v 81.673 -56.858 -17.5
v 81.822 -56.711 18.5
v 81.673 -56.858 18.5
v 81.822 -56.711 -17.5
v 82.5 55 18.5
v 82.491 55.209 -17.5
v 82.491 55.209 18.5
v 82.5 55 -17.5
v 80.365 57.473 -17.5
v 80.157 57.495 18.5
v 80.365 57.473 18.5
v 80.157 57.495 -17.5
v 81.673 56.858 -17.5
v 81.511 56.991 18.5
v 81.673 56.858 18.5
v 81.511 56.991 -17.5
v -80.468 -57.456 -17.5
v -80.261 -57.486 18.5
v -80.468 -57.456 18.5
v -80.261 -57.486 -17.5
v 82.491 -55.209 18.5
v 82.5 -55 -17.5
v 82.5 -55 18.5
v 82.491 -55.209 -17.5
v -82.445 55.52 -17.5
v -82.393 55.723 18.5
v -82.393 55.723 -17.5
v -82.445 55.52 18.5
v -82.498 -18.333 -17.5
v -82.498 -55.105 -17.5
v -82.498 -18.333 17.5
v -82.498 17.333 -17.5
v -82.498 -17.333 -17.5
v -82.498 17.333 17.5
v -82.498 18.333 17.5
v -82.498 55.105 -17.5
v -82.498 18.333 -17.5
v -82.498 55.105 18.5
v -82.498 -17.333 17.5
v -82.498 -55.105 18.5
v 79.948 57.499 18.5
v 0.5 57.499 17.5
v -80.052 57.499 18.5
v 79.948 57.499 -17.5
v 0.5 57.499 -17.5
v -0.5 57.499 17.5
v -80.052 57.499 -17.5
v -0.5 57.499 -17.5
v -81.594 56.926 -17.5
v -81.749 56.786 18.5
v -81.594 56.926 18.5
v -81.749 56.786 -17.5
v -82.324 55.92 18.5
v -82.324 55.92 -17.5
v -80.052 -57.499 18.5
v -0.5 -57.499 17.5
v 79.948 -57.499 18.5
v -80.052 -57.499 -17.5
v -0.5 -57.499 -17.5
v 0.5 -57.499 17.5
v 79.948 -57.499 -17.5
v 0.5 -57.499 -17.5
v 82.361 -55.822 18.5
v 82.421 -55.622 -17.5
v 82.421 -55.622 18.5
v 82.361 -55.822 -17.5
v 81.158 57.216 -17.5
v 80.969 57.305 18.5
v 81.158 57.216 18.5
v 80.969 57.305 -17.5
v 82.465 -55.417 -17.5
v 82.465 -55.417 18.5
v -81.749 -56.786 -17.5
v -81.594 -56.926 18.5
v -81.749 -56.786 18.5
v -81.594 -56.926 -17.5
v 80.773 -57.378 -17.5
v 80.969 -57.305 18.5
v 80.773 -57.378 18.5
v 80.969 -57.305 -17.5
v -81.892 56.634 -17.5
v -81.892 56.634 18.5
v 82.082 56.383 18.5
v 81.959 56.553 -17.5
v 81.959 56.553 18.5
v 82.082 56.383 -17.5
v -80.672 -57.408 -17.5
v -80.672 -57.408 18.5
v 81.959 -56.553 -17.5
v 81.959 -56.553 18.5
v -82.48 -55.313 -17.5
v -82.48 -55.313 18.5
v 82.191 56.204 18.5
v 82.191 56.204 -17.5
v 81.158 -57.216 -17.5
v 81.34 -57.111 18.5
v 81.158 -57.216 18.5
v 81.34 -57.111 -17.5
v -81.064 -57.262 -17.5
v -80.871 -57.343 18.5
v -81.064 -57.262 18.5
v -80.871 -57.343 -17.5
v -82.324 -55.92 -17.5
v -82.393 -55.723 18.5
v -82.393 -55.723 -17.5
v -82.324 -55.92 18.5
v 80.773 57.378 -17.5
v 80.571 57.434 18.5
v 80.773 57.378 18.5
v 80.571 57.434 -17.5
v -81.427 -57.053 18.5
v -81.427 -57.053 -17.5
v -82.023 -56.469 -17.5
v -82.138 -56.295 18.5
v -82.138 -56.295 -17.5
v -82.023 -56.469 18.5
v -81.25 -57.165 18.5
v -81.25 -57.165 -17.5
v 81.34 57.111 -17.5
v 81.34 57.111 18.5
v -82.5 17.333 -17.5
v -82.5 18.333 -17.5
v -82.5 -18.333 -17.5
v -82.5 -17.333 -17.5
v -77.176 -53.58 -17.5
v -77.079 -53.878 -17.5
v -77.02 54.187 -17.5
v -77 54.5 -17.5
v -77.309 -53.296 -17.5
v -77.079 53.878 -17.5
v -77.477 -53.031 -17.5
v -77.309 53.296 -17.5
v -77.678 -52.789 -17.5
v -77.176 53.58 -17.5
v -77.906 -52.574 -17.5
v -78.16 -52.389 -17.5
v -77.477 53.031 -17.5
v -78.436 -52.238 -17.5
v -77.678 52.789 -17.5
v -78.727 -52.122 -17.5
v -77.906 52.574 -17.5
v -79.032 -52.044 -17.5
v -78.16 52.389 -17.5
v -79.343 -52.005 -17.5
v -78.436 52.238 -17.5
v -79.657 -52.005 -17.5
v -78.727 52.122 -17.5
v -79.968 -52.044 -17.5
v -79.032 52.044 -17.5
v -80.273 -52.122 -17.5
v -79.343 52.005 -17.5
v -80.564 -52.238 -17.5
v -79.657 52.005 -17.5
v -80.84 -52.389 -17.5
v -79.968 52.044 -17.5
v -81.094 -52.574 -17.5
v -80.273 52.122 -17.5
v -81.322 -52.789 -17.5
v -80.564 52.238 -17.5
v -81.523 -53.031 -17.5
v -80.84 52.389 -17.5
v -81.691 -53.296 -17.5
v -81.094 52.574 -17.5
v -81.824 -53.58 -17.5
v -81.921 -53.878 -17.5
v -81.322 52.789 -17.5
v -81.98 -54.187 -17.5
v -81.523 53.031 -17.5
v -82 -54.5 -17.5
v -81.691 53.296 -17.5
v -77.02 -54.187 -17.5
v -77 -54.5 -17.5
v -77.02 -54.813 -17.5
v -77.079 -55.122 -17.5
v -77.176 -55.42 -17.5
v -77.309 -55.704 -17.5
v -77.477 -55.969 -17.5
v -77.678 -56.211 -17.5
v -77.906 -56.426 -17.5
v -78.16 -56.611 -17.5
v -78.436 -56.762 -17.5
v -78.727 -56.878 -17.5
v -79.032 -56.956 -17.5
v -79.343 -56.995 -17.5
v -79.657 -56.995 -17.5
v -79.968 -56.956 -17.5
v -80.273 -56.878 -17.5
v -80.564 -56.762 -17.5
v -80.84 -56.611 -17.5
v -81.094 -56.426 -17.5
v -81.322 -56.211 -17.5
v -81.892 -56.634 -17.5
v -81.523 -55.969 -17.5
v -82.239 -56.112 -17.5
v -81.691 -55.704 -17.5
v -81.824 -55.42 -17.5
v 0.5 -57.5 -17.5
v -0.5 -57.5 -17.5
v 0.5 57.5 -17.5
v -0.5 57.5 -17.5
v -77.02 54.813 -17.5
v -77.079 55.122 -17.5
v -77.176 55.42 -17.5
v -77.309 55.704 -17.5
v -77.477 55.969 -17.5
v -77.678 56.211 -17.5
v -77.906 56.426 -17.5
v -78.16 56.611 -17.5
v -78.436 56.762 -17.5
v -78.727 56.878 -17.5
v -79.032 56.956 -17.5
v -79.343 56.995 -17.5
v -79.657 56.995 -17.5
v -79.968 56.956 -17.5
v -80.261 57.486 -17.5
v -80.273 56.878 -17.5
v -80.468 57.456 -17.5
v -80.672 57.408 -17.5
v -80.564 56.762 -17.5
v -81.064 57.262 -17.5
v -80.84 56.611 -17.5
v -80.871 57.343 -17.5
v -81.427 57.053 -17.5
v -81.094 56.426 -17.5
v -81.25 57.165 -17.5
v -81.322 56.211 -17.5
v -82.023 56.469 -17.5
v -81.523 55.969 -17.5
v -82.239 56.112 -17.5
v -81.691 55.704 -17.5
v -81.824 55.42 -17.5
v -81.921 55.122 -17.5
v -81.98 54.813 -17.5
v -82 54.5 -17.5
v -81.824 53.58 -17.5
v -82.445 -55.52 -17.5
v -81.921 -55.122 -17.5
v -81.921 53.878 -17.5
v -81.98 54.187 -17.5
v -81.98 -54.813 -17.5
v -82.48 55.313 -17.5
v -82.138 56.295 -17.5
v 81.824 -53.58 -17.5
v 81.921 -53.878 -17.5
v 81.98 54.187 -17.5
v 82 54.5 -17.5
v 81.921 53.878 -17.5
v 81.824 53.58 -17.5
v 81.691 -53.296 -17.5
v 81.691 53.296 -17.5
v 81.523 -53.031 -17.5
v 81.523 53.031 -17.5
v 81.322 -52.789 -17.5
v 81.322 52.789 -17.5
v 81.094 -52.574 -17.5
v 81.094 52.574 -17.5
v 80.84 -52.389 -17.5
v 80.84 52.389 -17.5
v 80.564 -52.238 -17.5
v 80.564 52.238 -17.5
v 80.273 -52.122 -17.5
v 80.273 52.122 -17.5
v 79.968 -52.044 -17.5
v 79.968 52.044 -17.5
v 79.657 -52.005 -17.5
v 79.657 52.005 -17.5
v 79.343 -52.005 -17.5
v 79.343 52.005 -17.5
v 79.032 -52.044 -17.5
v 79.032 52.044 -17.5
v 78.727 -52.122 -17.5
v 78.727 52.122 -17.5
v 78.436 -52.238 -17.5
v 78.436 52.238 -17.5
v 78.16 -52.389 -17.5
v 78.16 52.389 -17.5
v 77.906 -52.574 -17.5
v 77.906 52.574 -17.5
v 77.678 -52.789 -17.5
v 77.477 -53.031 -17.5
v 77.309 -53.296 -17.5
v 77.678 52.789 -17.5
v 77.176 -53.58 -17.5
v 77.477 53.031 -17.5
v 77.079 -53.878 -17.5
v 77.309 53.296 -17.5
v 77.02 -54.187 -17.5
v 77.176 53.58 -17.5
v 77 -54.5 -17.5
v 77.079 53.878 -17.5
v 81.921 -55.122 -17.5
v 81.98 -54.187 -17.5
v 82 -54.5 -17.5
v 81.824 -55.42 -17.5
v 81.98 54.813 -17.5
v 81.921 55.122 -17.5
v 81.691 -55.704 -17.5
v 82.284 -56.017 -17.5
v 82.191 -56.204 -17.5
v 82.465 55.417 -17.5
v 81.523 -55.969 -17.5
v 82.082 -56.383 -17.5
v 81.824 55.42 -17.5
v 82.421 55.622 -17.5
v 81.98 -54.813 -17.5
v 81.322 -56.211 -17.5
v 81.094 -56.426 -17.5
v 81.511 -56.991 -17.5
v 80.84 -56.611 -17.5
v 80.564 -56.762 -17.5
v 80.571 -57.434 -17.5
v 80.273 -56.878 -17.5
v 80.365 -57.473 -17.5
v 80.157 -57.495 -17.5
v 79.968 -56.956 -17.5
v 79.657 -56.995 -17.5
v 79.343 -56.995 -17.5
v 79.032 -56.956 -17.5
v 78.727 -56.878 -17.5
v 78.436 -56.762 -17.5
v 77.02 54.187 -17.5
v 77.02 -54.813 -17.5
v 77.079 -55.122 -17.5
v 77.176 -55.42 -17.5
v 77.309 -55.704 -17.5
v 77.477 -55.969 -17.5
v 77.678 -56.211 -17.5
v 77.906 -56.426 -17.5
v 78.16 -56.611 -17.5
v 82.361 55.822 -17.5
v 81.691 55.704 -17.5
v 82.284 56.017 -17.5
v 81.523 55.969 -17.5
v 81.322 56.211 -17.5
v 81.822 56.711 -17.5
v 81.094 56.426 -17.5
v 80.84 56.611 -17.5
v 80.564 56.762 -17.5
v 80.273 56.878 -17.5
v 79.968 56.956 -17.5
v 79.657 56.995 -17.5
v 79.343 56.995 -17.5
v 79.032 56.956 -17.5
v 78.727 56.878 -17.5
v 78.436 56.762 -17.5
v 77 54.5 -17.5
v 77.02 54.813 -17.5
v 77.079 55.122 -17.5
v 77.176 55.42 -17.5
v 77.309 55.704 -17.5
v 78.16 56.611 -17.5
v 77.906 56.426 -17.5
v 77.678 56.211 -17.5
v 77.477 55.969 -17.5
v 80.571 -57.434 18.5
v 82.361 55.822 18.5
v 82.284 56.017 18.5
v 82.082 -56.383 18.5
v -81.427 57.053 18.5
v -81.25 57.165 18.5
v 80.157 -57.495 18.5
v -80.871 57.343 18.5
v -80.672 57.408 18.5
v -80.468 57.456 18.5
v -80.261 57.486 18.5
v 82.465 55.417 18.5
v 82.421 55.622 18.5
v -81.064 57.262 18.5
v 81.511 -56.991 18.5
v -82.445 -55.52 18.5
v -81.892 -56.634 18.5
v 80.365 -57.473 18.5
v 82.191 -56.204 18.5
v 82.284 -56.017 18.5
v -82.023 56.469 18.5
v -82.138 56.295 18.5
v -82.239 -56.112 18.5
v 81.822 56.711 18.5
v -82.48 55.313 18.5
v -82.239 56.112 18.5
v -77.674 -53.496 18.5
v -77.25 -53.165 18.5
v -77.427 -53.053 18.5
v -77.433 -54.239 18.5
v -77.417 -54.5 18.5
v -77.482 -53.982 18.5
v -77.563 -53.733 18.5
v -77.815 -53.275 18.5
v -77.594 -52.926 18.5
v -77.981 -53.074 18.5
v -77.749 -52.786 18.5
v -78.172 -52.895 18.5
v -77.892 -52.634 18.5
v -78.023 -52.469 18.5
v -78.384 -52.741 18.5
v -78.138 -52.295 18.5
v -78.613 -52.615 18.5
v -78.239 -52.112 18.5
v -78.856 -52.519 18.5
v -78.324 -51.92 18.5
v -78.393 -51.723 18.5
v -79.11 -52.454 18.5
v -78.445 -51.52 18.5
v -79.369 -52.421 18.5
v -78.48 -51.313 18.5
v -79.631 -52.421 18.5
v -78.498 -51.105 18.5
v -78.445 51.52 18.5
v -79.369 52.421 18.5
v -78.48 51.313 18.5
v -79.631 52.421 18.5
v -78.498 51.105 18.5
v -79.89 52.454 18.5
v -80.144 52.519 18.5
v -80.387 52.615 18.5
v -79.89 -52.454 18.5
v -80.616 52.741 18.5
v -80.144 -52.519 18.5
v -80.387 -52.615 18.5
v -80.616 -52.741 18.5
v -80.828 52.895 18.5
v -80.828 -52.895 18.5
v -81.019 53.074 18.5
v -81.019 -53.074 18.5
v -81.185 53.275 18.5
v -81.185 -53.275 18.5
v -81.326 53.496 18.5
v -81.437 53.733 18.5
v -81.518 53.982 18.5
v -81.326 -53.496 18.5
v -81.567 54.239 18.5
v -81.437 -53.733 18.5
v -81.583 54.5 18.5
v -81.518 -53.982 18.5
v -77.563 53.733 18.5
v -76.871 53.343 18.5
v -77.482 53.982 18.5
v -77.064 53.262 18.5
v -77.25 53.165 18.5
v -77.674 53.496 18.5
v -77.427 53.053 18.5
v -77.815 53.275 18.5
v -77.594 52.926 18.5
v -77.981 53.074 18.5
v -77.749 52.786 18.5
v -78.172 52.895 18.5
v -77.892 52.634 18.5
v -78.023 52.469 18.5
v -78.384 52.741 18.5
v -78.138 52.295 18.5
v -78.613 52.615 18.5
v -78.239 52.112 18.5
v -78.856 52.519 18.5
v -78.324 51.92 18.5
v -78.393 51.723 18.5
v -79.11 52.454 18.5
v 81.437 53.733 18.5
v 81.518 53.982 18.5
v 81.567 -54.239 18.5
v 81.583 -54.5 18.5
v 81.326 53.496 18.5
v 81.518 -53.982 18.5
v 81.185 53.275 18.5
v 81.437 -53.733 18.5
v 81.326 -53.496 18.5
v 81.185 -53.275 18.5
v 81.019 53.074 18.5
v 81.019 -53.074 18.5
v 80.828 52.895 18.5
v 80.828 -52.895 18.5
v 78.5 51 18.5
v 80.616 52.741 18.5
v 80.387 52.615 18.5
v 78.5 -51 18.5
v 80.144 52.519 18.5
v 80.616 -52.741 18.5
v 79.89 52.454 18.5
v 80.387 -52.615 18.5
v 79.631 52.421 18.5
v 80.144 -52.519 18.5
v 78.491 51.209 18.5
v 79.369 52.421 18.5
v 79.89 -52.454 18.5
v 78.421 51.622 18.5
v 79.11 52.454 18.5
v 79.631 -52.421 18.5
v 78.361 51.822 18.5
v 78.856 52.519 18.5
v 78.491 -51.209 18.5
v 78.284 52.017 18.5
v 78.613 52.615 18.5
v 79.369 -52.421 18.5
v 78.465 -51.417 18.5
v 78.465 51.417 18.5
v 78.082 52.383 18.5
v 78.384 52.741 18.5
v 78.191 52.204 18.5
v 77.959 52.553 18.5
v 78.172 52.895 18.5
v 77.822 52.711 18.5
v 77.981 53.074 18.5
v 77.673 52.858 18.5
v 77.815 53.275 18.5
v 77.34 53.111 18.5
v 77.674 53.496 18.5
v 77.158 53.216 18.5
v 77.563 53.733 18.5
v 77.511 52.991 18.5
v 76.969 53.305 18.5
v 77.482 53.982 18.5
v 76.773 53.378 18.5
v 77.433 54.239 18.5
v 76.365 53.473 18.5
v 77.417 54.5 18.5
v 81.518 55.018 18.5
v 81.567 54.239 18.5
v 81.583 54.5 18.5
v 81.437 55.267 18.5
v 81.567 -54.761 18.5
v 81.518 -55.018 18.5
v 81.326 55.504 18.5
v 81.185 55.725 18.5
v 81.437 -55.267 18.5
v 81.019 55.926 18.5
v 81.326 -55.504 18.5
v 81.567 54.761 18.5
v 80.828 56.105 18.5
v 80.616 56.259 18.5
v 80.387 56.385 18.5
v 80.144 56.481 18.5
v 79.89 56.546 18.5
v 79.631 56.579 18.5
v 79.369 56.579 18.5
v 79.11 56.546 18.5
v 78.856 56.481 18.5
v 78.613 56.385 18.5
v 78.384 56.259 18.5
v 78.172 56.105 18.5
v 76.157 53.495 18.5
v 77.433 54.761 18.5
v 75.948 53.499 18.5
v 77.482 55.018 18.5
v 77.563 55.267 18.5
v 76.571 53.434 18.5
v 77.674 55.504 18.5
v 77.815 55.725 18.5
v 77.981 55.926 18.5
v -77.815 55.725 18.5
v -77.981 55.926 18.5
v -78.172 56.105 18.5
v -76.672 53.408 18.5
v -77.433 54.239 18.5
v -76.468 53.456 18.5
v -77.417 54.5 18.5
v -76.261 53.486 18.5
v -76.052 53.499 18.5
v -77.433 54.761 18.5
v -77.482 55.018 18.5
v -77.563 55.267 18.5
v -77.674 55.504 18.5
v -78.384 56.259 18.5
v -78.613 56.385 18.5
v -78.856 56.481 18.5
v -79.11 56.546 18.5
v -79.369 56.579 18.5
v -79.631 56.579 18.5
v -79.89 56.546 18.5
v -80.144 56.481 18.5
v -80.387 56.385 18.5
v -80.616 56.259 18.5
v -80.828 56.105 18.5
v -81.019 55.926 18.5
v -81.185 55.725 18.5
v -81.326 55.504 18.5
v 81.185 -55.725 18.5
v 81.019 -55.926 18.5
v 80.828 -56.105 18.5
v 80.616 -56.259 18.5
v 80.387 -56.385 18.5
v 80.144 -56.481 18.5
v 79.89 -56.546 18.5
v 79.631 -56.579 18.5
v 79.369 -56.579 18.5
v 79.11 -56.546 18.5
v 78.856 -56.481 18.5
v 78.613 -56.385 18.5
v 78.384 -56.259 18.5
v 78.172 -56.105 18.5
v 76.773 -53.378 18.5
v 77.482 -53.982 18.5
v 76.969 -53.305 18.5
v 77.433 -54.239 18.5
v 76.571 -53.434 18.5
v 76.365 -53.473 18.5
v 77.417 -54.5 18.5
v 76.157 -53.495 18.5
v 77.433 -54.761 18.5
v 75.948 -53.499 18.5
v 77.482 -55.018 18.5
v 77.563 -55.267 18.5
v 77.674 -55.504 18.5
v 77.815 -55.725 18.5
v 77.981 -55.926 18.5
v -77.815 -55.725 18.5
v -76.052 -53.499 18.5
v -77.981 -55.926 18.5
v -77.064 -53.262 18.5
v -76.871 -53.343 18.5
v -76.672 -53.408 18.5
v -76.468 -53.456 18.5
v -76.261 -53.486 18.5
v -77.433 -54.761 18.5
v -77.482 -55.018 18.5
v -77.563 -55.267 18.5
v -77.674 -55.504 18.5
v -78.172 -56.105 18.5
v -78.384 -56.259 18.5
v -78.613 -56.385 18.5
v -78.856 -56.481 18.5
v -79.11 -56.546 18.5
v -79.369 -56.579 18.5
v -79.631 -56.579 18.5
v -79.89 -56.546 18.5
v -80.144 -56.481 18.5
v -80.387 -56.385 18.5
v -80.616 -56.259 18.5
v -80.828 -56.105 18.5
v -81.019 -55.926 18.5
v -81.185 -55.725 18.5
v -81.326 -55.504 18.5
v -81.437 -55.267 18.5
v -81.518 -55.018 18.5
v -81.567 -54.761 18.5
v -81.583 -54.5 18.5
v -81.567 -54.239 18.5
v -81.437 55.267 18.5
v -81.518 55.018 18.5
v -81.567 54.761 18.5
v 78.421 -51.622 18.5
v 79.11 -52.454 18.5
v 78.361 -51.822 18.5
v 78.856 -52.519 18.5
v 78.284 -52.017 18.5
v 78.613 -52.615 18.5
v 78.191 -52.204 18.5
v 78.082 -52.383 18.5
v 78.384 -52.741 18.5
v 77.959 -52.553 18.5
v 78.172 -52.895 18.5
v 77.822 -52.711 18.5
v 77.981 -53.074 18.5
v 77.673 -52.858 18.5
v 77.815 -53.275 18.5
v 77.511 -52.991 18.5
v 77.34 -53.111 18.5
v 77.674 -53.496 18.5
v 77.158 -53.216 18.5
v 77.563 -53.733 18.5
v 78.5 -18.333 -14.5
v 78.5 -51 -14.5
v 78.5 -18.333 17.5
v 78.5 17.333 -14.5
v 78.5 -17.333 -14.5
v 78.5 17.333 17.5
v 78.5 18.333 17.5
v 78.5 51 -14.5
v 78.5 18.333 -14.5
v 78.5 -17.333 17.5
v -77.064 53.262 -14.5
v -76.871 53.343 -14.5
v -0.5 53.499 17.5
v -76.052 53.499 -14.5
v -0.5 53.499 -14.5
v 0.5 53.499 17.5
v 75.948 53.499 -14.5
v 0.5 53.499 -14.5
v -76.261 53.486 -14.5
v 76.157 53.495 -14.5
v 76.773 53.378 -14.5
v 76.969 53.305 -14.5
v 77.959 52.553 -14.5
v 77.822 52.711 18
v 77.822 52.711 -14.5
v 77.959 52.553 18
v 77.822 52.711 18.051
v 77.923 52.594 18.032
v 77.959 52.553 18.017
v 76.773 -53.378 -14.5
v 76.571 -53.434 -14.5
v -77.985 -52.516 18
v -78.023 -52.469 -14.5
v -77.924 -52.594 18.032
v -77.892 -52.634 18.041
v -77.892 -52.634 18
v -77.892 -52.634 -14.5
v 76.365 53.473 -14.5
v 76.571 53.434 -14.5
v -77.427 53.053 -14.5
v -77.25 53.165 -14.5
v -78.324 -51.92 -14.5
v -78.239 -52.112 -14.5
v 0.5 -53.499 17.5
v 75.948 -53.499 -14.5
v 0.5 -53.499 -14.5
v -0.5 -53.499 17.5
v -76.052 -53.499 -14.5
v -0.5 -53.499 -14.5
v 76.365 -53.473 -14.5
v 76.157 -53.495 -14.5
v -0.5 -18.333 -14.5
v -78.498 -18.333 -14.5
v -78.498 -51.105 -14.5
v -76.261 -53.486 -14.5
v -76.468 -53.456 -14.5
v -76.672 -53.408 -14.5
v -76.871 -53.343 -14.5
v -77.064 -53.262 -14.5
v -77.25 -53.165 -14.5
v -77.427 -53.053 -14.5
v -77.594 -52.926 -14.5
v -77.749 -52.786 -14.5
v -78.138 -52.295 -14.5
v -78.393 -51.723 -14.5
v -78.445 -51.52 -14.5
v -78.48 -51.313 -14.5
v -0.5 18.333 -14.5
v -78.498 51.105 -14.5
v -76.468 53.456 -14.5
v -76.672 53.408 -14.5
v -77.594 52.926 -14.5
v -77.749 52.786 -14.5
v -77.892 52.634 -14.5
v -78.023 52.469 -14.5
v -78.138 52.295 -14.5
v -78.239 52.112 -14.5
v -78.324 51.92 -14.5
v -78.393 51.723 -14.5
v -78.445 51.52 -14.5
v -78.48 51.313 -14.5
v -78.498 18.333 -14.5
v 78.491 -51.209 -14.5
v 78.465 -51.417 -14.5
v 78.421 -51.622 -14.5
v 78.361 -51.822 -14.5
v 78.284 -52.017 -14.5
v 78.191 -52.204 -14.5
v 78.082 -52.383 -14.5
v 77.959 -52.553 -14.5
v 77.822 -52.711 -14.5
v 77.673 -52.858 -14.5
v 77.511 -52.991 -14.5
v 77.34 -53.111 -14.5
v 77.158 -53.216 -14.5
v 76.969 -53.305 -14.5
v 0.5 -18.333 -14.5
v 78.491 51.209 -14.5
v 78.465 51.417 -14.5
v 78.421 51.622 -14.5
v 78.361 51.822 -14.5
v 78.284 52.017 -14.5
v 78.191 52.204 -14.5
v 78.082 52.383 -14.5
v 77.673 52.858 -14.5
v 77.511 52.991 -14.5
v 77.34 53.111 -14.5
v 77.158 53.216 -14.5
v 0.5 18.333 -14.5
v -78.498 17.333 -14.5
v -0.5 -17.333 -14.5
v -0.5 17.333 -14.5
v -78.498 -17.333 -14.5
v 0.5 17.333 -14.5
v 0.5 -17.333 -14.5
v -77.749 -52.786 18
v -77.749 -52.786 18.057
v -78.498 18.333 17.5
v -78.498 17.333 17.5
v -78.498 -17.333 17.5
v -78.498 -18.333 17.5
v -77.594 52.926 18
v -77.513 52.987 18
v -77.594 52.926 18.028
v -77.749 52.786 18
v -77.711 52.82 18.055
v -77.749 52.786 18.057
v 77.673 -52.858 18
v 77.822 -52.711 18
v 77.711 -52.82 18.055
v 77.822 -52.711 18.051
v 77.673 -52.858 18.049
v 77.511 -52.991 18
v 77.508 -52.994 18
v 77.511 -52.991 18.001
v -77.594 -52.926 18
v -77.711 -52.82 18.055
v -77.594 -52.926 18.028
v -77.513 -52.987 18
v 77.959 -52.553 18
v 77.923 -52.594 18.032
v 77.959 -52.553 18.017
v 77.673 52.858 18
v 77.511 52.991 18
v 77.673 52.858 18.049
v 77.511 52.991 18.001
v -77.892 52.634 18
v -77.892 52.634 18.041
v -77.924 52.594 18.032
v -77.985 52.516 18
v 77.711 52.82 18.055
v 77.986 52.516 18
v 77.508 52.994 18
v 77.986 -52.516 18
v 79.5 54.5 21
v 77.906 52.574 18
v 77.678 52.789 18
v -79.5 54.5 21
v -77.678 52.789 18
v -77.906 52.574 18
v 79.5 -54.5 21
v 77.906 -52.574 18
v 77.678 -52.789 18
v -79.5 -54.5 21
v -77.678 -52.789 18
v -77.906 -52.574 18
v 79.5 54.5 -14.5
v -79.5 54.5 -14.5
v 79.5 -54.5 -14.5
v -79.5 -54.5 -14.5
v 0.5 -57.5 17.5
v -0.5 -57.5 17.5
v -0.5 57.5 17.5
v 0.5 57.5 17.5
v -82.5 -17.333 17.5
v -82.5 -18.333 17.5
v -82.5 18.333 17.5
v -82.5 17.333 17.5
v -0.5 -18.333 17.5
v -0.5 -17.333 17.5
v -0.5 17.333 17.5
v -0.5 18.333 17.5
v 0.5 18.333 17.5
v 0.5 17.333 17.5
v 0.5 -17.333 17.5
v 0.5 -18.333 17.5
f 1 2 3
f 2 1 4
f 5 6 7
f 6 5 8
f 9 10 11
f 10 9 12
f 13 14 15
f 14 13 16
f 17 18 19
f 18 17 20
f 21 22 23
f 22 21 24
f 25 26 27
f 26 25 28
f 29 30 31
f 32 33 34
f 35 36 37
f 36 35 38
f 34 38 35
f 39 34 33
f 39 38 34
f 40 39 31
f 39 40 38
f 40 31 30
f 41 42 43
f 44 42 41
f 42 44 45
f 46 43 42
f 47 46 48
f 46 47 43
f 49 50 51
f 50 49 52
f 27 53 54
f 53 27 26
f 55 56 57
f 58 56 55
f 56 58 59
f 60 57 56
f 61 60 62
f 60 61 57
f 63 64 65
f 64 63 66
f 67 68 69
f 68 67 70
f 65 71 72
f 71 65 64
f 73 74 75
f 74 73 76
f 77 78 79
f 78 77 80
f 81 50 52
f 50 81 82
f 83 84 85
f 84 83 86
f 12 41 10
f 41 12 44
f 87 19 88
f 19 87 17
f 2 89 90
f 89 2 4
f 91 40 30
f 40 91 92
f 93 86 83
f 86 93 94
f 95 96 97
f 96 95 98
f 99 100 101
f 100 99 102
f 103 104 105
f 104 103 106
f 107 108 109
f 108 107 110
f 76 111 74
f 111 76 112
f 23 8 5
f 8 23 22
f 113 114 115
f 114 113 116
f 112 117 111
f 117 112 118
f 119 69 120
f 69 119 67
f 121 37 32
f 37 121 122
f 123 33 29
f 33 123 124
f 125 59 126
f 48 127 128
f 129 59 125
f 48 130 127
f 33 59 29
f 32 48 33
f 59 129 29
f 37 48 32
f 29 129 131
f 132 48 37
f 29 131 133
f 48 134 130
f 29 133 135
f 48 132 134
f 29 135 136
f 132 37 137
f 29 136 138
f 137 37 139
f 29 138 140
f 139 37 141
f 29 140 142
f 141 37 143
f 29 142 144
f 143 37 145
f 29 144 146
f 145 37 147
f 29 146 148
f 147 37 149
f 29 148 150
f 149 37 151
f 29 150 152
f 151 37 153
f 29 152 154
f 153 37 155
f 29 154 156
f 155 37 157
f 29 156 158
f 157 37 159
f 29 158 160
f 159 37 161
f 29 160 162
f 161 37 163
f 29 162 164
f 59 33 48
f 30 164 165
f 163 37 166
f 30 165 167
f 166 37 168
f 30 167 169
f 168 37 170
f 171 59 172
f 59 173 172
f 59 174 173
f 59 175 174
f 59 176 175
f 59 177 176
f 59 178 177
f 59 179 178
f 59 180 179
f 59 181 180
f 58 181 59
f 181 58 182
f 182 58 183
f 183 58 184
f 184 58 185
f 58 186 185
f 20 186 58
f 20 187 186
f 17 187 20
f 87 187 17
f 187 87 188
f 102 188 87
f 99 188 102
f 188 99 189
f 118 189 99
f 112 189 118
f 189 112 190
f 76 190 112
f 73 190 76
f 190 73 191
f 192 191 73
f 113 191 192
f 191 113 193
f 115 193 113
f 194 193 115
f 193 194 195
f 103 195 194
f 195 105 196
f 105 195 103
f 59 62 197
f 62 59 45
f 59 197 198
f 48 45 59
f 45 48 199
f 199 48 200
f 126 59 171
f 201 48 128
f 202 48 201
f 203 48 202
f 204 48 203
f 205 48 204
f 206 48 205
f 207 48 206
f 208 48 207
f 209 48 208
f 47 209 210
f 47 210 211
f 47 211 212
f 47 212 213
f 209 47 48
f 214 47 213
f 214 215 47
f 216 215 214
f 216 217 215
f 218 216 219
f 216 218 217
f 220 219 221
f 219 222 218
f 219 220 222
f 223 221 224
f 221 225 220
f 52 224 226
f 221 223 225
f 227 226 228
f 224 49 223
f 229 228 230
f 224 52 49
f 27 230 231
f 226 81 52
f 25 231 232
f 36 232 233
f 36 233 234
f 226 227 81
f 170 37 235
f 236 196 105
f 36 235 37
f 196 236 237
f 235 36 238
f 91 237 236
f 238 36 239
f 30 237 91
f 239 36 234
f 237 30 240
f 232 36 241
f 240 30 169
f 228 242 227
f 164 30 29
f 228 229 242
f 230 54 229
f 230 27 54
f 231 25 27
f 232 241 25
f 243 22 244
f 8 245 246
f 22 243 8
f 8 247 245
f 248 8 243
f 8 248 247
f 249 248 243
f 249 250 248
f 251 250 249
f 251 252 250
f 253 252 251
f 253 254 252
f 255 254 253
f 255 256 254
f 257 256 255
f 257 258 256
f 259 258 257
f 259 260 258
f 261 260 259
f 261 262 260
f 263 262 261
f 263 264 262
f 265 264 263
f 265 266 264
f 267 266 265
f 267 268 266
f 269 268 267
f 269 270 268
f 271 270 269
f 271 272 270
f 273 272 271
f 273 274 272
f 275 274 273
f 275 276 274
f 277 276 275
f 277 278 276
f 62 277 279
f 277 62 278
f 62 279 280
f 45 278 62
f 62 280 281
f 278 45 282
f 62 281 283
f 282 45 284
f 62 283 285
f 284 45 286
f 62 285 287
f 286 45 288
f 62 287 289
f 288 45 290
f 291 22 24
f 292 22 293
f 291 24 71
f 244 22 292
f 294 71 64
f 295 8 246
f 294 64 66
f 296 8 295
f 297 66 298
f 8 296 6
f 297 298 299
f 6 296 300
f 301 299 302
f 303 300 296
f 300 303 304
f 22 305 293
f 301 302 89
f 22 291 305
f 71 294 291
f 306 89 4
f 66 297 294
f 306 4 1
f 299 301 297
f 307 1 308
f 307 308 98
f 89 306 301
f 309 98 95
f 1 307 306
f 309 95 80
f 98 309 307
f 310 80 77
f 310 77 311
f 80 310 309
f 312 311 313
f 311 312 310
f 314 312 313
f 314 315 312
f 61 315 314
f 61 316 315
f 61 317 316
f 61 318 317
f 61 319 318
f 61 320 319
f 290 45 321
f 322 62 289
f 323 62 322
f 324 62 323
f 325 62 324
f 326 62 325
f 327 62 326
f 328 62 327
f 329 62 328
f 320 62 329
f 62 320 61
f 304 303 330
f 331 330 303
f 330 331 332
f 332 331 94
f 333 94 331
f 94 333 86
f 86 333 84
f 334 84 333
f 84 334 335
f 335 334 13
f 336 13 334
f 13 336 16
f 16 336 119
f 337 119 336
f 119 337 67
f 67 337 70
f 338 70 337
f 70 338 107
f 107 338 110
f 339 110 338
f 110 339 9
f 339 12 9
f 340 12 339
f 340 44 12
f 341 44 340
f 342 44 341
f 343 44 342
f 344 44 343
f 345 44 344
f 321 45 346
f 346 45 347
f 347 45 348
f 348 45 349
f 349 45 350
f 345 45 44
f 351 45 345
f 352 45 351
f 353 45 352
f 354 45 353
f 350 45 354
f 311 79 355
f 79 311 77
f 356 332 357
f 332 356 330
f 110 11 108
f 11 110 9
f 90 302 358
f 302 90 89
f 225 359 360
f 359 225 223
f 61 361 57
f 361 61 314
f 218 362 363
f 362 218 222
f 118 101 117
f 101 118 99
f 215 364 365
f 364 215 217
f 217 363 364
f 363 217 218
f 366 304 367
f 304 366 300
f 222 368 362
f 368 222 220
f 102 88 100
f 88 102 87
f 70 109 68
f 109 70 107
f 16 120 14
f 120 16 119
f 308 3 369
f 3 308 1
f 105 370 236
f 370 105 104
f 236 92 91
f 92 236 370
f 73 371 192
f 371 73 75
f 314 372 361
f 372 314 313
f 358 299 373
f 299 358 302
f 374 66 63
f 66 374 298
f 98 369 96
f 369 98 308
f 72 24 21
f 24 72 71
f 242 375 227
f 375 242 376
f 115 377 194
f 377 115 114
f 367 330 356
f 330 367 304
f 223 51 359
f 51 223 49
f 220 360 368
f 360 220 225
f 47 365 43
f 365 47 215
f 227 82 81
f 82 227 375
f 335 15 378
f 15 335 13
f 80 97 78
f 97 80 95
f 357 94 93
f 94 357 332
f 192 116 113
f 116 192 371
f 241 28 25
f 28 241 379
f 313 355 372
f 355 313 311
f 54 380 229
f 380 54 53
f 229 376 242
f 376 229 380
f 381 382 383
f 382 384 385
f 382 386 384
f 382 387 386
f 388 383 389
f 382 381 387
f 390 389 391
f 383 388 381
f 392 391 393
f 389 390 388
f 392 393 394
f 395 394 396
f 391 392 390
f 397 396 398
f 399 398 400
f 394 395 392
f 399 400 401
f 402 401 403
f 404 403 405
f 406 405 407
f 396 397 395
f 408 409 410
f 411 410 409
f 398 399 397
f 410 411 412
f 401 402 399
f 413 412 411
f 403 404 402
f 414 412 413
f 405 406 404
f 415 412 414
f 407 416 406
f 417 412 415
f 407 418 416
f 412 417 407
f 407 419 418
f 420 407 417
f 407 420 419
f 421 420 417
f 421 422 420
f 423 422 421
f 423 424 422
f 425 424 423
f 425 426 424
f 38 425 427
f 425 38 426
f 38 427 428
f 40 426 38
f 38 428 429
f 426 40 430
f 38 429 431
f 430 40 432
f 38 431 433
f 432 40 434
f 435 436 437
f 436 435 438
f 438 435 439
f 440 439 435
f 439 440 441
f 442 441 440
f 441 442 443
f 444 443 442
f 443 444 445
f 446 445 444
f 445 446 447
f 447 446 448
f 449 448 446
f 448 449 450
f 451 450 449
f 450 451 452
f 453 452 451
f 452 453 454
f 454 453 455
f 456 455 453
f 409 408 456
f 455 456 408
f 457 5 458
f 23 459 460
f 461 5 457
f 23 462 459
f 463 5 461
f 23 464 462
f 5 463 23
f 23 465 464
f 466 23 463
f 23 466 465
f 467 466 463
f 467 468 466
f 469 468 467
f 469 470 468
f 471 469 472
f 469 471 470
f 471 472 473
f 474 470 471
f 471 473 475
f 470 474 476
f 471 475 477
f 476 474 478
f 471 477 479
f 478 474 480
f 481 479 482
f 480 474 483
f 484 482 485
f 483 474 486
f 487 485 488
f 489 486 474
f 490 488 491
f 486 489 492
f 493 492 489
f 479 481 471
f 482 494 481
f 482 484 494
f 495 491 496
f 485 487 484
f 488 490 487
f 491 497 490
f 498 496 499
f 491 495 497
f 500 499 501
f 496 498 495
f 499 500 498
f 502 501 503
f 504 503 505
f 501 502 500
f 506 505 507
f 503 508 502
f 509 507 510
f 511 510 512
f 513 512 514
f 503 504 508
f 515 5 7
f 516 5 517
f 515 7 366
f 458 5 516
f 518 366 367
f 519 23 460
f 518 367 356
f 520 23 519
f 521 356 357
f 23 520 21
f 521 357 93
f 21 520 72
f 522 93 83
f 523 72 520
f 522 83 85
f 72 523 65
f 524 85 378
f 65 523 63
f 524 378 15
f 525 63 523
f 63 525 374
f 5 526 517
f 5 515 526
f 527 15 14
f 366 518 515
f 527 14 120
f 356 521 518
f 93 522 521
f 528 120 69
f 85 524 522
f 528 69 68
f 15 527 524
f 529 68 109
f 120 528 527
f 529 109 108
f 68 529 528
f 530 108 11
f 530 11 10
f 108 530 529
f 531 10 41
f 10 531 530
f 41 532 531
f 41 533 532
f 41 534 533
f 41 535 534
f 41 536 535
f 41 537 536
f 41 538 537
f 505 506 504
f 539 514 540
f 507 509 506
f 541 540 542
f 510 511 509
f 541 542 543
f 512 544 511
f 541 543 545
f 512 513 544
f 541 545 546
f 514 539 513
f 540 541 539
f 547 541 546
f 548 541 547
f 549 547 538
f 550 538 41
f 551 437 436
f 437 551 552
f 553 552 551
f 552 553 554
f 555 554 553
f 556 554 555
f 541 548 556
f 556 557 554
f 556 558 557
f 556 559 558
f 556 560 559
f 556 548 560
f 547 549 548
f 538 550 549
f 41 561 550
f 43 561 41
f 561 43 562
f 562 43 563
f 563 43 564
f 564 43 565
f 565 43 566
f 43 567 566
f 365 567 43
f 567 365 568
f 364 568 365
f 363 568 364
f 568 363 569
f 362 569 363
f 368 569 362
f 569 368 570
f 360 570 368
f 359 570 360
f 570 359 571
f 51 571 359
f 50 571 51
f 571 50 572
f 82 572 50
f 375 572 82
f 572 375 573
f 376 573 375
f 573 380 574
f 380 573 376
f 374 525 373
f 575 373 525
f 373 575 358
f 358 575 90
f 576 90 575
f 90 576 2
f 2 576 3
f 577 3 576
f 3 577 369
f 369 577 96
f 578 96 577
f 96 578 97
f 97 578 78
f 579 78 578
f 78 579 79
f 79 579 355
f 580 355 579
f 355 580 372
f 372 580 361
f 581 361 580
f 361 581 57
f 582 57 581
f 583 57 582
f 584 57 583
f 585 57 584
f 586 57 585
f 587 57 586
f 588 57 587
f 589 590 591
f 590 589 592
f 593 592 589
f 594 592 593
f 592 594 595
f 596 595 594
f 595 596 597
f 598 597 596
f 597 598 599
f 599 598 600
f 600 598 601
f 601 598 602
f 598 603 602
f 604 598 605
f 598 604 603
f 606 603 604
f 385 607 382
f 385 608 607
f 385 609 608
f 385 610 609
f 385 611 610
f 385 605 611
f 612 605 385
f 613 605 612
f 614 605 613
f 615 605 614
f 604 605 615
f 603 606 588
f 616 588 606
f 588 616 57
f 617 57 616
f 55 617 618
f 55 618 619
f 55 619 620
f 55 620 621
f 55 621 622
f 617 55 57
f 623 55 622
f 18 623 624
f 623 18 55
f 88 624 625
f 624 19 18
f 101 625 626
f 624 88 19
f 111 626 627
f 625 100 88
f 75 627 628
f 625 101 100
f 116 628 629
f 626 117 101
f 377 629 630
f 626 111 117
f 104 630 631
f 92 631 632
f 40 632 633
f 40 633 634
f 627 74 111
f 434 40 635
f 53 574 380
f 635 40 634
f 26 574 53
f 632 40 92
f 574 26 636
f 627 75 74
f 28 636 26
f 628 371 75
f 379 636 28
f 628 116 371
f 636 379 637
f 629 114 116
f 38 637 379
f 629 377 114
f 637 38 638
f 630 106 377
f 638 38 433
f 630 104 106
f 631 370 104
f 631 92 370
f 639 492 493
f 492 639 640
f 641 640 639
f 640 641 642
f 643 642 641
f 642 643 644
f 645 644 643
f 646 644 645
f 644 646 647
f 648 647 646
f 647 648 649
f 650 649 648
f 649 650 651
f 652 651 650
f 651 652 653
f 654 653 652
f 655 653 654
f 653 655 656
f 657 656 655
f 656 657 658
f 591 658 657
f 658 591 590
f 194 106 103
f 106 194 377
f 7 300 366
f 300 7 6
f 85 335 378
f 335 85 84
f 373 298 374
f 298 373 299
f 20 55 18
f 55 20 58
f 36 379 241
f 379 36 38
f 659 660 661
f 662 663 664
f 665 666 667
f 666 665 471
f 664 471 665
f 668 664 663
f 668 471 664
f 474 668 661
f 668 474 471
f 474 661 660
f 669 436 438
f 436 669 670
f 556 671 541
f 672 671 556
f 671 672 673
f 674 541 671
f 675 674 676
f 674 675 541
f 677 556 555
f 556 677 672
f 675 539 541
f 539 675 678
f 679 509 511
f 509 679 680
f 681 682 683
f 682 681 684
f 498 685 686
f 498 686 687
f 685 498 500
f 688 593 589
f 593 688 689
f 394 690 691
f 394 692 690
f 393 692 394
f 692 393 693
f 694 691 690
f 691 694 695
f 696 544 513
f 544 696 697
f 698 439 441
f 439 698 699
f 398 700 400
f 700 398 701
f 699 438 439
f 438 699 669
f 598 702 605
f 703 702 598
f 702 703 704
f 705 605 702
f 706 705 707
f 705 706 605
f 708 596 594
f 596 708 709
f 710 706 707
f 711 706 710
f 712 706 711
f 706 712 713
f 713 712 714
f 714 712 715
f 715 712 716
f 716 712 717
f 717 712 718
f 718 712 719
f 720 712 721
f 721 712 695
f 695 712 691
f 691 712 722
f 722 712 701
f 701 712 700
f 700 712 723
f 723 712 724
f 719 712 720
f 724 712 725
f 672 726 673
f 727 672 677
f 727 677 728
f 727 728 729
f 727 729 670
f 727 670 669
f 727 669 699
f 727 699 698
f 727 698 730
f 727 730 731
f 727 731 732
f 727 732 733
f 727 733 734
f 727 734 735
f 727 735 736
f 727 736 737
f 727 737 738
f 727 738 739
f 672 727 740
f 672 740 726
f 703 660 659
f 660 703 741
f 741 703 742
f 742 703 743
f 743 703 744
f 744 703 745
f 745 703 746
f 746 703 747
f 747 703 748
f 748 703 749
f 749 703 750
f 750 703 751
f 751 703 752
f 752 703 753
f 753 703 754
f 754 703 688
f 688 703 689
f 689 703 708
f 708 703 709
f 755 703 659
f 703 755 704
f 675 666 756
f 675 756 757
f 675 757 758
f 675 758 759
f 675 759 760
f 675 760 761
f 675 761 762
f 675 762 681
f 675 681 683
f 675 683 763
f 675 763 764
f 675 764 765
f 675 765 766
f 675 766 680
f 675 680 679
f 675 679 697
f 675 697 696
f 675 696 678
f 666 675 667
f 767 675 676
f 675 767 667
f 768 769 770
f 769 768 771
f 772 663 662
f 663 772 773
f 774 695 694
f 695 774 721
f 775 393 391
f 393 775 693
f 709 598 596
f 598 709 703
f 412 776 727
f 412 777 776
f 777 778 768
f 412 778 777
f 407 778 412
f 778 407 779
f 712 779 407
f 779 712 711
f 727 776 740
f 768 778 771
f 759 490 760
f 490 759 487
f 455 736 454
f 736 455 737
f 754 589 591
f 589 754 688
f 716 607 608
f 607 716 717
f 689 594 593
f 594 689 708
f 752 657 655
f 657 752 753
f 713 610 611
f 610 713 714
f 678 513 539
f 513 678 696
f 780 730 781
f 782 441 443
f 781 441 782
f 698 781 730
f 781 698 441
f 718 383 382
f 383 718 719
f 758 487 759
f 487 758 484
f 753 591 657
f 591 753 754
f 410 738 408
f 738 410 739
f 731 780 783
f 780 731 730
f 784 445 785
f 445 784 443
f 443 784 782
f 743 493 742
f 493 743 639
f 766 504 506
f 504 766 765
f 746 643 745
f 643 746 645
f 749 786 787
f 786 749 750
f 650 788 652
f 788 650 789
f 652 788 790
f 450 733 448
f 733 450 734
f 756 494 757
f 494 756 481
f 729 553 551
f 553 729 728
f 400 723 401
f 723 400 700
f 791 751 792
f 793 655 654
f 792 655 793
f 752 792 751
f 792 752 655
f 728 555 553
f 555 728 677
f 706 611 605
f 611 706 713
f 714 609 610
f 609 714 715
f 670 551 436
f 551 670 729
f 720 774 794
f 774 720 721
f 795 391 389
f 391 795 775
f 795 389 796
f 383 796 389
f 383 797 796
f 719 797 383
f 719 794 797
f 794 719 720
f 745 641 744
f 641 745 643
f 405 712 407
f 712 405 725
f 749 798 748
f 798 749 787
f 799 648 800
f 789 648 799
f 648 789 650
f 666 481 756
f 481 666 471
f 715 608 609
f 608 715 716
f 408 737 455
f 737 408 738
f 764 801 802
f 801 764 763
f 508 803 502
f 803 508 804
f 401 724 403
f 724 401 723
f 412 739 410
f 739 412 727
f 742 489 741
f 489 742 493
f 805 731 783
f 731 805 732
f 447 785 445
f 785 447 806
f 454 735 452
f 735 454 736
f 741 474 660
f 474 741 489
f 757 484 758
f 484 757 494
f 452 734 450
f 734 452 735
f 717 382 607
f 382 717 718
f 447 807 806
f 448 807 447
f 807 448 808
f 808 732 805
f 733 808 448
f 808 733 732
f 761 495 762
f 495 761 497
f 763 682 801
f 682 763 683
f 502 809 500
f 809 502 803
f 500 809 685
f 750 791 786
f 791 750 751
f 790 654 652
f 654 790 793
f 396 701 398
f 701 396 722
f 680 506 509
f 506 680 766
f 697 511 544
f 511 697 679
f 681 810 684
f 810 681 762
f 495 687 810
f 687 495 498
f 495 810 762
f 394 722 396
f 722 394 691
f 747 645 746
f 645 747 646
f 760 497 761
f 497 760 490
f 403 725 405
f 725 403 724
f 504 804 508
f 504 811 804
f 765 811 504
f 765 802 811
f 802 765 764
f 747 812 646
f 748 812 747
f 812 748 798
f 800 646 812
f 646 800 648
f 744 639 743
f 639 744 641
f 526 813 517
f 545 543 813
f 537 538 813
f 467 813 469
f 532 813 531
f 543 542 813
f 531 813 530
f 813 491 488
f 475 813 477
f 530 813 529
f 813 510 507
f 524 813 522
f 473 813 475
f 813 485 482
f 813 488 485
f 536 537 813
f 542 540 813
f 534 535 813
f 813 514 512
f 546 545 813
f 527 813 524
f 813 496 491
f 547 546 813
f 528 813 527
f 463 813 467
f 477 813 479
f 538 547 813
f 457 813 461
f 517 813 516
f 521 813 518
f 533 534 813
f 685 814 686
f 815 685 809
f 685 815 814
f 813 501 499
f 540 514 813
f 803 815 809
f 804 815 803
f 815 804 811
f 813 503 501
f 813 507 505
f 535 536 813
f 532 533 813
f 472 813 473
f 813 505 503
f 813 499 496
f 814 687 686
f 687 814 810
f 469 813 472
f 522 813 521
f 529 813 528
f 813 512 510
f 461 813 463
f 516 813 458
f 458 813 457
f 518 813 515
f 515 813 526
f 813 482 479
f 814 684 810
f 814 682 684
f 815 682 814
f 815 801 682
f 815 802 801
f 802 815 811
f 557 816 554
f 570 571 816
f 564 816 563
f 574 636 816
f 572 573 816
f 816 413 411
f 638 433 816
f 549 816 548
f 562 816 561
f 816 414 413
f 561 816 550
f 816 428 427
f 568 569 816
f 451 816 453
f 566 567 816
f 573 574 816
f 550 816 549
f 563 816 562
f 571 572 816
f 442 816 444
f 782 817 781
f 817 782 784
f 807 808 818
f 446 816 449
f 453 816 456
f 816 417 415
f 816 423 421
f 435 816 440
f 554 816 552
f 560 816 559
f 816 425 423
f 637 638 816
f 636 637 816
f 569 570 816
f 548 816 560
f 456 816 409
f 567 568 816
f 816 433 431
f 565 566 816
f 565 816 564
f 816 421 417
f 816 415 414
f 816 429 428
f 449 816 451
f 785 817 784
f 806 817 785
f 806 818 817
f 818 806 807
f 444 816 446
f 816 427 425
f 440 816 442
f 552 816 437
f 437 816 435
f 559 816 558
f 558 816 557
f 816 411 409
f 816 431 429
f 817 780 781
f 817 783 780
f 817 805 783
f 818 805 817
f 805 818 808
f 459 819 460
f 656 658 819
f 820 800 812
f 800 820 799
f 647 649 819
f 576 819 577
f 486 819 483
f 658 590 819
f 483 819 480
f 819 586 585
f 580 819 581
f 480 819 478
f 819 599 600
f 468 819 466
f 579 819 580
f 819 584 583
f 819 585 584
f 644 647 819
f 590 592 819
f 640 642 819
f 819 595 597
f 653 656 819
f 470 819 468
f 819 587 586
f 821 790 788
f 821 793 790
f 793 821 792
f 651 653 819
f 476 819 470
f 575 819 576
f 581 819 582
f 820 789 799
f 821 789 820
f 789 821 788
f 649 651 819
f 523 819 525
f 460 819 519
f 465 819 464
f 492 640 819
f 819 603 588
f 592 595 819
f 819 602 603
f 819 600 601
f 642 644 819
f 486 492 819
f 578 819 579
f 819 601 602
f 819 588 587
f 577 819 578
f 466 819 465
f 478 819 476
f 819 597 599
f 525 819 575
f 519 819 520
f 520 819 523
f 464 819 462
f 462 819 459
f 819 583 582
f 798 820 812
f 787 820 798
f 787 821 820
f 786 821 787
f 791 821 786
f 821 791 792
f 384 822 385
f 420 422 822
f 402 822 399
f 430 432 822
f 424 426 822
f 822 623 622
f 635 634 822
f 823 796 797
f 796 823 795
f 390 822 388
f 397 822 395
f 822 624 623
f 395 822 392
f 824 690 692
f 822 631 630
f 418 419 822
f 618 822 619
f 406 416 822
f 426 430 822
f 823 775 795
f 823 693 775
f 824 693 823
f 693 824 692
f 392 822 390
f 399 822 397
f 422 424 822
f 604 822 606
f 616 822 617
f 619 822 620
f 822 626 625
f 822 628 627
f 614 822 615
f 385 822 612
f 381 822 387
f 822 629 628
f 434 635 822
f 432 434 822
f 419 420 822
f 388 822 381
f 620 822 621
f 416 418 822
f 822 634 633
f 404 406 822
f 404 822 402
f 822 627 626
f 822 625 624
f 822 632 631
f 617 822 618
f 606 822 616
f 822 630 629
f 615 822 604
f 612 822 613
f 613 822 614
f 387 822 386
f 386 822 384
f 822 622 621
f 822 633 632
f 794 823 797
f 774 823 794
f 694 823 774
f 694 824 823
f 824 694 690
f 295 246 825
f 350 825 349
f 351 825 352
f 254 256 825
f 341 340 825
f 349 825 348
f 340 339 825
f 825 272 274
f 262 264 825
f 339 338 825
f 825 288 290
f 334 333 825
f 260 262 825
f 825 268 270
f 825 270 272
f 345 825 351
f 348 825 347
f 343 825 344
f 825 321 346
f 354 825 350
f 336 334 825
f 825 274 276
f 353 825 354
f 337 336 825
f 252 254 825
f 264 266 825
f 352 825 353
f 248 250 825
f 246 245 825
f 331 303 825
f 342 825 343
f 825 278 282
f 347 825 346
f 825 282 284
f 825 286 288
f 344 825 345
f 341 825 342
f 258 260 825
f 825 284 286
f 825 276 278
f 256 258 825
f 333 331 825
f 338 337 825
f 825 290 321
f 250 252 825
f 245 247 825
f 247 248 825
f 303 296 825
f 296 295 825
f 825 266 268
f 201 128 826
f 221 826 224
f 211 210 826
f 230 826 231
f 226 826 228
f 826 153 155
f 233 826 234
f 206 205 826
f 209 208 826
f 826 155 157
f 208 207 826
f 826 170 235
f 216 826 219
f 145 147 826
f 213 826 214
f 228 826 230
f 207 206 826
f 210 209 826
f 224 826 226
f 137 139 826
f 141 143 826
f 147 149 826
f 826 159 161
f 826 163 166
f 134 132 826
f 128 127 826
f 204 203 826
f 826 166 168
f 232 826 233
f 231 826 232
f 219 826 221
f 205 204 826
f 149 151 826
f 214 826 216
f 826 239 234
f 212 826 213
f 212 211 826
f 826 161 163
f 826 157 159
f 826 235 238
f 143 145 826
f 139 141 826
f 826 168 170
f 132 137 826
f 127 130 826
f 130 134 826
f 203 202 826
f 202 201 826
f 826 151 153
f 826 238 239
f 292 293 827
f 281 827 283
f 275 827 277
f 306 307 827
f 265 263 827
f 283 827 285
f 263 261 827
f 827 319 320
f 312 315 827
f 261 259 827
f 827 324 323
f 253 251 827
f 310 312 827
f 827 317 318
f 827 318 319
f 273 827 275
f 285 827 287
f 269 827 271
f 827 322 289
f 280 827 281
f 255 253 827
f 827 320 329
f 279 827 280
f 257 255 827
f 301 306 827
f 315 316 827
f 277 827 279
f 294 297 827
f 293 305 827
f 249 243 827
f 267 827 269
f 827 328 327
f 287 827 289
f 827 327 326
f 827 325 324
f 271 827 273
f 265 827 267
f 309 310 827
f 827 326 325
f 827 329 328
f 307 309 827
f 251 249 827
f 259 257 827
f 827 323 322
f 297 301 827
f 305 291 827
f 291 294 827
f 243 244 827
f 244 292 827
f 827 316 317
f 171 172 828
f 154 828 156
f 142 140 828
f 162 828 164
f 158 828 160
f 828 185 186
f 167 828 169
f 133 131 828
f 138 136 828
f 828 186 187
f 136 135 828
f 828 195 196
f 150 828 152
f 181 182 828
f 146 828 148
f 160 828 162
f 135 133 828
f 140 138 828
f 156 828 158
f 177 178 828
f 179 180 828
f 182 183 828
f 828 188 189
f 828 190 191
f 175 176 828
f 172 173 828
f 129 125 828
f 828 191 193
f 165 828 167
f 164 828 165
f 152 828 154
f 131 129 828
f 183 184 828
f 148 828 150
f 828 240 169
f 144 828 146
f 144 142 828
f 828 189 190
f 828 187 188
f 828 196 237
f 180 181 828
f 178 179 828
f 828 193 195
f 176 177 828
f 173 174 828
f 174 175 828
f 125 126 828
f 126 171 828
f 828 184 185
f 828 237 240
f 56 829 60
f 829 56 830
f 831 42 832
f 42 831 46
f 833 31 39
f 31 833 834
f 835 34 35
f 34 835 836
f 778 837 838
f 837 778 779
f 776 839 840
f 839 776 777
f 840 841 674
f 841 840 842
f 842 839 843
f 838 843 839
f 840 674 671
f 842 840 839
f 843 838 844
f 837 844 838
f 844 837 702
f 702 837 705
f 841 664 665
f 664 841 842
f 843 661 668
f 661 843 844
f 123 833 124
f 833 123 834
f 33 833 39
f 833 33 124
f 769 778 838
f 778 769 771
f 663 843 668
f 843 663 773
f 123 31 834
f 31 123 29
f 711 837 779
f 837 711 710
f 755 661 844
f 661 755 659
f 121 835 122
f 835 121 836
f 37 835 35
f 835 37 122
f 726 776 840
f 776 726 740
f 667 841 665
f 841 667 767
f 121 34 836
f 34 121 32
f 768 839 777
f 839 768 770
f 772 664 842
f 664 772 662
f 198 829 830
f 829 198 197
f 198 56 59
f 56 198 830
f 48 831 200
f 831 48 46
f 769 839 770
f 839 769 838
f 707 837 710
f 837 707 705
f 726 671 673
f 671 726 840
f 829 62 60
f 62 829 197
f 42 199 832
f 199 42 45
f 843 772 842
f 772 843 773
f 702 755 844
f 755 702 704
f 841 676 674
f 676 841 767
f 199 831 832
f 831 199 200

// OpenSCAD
// openscad -o Stapelbox_rows_columns.stl -D 'rows=2'  -D 'columns=3' -D 'width=160' -D 'depth=80' -D 'height=20' Stapelbox.scad 


/* Bash script
#!/bin/bash
rows=5
columns=5

for (( r = 1; r <= ${rows}; r++ )) 
do
    for (( c = 1; c <= ${columns}; c++ )) 
    do
        cmd="openscad -o Stapelbox_${r}_${c}.stl -D 'rows=${r}'  -D 'columns=${c}' -D 'width=160' -D 'depth=80' -D 'height=20' Stapelbox.scad"
        echo $cmd
        $cmd
    done
done
*/

fnQuali=75;

module boxBody(depth, width, height, roundsize) {
    union() {
        minkowski() {
            cube([  width - (roundsize),
                    depth - (roundsize),
                    height], true);
            cylinder(d=roundsize, h=1, $fn=fnQuali);
        }
    }
}

module boxRecess(depth,width,height,roundsize,wallthick) {
    union() {
        minkowski() {
            cube([  width - (2 * wallthick) - (roundsize),
                    depth - (2 * wallthick) - (roundsize),
                    height], true);
            cylinder(d=roundsize, h=1, $fn=fnQuali);
        }
    }
}

module boxFrame(depth,width,height,roundsize,wallthick, bottomthick) {
    union() {
        difference() {
            boxBody(depth,width,height,roundsize);
            translate([0,0,bottomthick])
                boxRecess(depth,width,height,roundsize,wallthick);
        }
    }
}

module cover(depth = 100, width = 50, height = 20, roundsize = 5, wallthick = 4) {
    difference() {
        box(depth,width,height,roundsize,wallthick);
        translate([0,0,wallthick])
            cube([width + 5,depth + 5,height], true);
    }    
}

module pin() {
    cylinder(h=3, r1=2.5, r2=0, center=true,$fn=50);
}

module hole() {
    cylinder(h=3, r1=2.5, r2=0, center=true, $fn=50);
}


module holesBottom(depth = 100, width = 50, height = 20, wallthick = 4){
    union() {
        translate([width/2 - 3.0,depth/2 - 3.0,-height/2 + (1.5)])
            hole();

        translate([-width/2 + 3.0,depth/2 - 3.0,-height/2 + (1.5)])
            hole();

        translate([width/2 - 3.0,-depth/2 + 3.0,-height/2 + (1.5)])
            hole();

        translate([-width/2 + 3.0,-depth/2 + 3.0,-height/2 + (1.5)])
            hole();
    
    }
}
module pinsTop(depth = 100, width = 50, height = 20, wallthick = 4){
    union() {
        translate([width/2 - 3.0,depth/2 - 3.0,height/2 + (2)]) //hole h=3, minkowski size = 1
            pin();

        translate([-width/2 + 3.0,depth/2 - 3.0,height/2 + (2)]) //hole h=3, minkowski size = 1
            pin();

        translate([width/2 - 3.0,-depth/2 + 3.0,height/2 + (2)]) //hole h=3, minkowski size = 1
            pin();

        translate([-width/2 + 3.0,-depth/2 + 3.0,height/2 + (2)]) //hole h=3, minkowski size = 1
            pin();
    
    }
}

module box(depth = 100, width = 50, height = 20, roundsize = 5, wallthick = 4, bottomthick = 3) {
    echo("Measure outside:",  depth, "x", width, "x", height);
    echo("Measure inside:",  depth - 2*wallthick, "x", width - 2*wallthick, "x", height-bottomthick);
    echo("Wallthick:", wallthick);
        
    difference() {
        union(){
            boxFrame(depth,width,height,roundsize,wallthick,bottomthick);
            pinsTop(depth,width,height,wallthick);
        }
        holesBottom(depth,width,height,wallthick);
    }
}

module probeschnitt() {
        union() {
        translate([0,-30,0]) {
            cube([200,250,15], true);
            cube([300,200,50], true);
        }
    }
}

module dividers(rows = 2, columns = 3, width = 100, depth = 50, height = 20, wallthick = 4, bottomthick = 3, dividerthick = 2) {
    echo("Dividers: rows=", rows, "columns=", columns);
    
    if (rows < 2 || columns < 2) {
        echo("WARNING");
        echo("rows or columns < 2");
        echo("WARNING");
    }
    
    rowSize = (width - 2 * wallthick) / rows;
    columnSize = (depth - 2 * wallthick) / columns;
    
    if (rows > 1) {
        for(r = [1 : (rows-1)]) {
            translate([-(width/2 - wallthick) + (rowSize * r) ,0 , 0])
                divider("horizontal", width, depth, height, wallthick, bottomthick, dividerthick);
        }
    }
    
    if ( columns > 1) {
        for(c = [1 : (columns-1)]) {
            translate([0, -(depth/2 - wallthick) + (columnSize* c), 0]) 
                divider("vertical", width, depth, height, wallthick, bottomthick, dividerthick);
        }
    }    
}

module divider(orientation = "horizontal", width = 50, depth = 100, height = 20, wallthick = 4, bottomthick = 3, dividerthick = 2) {
    if (orientation == "horizontal") {
        rotate([0,0,90])
            cube([depth, dividerthick, height], true);

    }
    else if (orientation == "vertical") {
        cube([width, dividerthick, height], true);
    }
    else {
        cube(20, true);
    }
}



/*  Größen
depth           = 165;
width           = 115;
height          = 25;
roundsize       = 5;
wallthick       = 4;
bottomthick     = 3;
dividerthick    = 1;
*/

depth           = 115;
width           = 165;
height          = 35;
roundsize       = 5;
wallthick       = 4;
bottomthick     = 3;
dividerthick    = 1;
rows            = 2;
columns         = 3;


*cover(depth, width, height, roundsize, wallthick);

difference() {
    union() {
        box(depth, width, height, roundsize, wallthick, bottomthick);
        dividers(rows, columns, width, depth, height, wallthick, bottomthick, dividerthick);
    }
    *probeschnitt();
}
